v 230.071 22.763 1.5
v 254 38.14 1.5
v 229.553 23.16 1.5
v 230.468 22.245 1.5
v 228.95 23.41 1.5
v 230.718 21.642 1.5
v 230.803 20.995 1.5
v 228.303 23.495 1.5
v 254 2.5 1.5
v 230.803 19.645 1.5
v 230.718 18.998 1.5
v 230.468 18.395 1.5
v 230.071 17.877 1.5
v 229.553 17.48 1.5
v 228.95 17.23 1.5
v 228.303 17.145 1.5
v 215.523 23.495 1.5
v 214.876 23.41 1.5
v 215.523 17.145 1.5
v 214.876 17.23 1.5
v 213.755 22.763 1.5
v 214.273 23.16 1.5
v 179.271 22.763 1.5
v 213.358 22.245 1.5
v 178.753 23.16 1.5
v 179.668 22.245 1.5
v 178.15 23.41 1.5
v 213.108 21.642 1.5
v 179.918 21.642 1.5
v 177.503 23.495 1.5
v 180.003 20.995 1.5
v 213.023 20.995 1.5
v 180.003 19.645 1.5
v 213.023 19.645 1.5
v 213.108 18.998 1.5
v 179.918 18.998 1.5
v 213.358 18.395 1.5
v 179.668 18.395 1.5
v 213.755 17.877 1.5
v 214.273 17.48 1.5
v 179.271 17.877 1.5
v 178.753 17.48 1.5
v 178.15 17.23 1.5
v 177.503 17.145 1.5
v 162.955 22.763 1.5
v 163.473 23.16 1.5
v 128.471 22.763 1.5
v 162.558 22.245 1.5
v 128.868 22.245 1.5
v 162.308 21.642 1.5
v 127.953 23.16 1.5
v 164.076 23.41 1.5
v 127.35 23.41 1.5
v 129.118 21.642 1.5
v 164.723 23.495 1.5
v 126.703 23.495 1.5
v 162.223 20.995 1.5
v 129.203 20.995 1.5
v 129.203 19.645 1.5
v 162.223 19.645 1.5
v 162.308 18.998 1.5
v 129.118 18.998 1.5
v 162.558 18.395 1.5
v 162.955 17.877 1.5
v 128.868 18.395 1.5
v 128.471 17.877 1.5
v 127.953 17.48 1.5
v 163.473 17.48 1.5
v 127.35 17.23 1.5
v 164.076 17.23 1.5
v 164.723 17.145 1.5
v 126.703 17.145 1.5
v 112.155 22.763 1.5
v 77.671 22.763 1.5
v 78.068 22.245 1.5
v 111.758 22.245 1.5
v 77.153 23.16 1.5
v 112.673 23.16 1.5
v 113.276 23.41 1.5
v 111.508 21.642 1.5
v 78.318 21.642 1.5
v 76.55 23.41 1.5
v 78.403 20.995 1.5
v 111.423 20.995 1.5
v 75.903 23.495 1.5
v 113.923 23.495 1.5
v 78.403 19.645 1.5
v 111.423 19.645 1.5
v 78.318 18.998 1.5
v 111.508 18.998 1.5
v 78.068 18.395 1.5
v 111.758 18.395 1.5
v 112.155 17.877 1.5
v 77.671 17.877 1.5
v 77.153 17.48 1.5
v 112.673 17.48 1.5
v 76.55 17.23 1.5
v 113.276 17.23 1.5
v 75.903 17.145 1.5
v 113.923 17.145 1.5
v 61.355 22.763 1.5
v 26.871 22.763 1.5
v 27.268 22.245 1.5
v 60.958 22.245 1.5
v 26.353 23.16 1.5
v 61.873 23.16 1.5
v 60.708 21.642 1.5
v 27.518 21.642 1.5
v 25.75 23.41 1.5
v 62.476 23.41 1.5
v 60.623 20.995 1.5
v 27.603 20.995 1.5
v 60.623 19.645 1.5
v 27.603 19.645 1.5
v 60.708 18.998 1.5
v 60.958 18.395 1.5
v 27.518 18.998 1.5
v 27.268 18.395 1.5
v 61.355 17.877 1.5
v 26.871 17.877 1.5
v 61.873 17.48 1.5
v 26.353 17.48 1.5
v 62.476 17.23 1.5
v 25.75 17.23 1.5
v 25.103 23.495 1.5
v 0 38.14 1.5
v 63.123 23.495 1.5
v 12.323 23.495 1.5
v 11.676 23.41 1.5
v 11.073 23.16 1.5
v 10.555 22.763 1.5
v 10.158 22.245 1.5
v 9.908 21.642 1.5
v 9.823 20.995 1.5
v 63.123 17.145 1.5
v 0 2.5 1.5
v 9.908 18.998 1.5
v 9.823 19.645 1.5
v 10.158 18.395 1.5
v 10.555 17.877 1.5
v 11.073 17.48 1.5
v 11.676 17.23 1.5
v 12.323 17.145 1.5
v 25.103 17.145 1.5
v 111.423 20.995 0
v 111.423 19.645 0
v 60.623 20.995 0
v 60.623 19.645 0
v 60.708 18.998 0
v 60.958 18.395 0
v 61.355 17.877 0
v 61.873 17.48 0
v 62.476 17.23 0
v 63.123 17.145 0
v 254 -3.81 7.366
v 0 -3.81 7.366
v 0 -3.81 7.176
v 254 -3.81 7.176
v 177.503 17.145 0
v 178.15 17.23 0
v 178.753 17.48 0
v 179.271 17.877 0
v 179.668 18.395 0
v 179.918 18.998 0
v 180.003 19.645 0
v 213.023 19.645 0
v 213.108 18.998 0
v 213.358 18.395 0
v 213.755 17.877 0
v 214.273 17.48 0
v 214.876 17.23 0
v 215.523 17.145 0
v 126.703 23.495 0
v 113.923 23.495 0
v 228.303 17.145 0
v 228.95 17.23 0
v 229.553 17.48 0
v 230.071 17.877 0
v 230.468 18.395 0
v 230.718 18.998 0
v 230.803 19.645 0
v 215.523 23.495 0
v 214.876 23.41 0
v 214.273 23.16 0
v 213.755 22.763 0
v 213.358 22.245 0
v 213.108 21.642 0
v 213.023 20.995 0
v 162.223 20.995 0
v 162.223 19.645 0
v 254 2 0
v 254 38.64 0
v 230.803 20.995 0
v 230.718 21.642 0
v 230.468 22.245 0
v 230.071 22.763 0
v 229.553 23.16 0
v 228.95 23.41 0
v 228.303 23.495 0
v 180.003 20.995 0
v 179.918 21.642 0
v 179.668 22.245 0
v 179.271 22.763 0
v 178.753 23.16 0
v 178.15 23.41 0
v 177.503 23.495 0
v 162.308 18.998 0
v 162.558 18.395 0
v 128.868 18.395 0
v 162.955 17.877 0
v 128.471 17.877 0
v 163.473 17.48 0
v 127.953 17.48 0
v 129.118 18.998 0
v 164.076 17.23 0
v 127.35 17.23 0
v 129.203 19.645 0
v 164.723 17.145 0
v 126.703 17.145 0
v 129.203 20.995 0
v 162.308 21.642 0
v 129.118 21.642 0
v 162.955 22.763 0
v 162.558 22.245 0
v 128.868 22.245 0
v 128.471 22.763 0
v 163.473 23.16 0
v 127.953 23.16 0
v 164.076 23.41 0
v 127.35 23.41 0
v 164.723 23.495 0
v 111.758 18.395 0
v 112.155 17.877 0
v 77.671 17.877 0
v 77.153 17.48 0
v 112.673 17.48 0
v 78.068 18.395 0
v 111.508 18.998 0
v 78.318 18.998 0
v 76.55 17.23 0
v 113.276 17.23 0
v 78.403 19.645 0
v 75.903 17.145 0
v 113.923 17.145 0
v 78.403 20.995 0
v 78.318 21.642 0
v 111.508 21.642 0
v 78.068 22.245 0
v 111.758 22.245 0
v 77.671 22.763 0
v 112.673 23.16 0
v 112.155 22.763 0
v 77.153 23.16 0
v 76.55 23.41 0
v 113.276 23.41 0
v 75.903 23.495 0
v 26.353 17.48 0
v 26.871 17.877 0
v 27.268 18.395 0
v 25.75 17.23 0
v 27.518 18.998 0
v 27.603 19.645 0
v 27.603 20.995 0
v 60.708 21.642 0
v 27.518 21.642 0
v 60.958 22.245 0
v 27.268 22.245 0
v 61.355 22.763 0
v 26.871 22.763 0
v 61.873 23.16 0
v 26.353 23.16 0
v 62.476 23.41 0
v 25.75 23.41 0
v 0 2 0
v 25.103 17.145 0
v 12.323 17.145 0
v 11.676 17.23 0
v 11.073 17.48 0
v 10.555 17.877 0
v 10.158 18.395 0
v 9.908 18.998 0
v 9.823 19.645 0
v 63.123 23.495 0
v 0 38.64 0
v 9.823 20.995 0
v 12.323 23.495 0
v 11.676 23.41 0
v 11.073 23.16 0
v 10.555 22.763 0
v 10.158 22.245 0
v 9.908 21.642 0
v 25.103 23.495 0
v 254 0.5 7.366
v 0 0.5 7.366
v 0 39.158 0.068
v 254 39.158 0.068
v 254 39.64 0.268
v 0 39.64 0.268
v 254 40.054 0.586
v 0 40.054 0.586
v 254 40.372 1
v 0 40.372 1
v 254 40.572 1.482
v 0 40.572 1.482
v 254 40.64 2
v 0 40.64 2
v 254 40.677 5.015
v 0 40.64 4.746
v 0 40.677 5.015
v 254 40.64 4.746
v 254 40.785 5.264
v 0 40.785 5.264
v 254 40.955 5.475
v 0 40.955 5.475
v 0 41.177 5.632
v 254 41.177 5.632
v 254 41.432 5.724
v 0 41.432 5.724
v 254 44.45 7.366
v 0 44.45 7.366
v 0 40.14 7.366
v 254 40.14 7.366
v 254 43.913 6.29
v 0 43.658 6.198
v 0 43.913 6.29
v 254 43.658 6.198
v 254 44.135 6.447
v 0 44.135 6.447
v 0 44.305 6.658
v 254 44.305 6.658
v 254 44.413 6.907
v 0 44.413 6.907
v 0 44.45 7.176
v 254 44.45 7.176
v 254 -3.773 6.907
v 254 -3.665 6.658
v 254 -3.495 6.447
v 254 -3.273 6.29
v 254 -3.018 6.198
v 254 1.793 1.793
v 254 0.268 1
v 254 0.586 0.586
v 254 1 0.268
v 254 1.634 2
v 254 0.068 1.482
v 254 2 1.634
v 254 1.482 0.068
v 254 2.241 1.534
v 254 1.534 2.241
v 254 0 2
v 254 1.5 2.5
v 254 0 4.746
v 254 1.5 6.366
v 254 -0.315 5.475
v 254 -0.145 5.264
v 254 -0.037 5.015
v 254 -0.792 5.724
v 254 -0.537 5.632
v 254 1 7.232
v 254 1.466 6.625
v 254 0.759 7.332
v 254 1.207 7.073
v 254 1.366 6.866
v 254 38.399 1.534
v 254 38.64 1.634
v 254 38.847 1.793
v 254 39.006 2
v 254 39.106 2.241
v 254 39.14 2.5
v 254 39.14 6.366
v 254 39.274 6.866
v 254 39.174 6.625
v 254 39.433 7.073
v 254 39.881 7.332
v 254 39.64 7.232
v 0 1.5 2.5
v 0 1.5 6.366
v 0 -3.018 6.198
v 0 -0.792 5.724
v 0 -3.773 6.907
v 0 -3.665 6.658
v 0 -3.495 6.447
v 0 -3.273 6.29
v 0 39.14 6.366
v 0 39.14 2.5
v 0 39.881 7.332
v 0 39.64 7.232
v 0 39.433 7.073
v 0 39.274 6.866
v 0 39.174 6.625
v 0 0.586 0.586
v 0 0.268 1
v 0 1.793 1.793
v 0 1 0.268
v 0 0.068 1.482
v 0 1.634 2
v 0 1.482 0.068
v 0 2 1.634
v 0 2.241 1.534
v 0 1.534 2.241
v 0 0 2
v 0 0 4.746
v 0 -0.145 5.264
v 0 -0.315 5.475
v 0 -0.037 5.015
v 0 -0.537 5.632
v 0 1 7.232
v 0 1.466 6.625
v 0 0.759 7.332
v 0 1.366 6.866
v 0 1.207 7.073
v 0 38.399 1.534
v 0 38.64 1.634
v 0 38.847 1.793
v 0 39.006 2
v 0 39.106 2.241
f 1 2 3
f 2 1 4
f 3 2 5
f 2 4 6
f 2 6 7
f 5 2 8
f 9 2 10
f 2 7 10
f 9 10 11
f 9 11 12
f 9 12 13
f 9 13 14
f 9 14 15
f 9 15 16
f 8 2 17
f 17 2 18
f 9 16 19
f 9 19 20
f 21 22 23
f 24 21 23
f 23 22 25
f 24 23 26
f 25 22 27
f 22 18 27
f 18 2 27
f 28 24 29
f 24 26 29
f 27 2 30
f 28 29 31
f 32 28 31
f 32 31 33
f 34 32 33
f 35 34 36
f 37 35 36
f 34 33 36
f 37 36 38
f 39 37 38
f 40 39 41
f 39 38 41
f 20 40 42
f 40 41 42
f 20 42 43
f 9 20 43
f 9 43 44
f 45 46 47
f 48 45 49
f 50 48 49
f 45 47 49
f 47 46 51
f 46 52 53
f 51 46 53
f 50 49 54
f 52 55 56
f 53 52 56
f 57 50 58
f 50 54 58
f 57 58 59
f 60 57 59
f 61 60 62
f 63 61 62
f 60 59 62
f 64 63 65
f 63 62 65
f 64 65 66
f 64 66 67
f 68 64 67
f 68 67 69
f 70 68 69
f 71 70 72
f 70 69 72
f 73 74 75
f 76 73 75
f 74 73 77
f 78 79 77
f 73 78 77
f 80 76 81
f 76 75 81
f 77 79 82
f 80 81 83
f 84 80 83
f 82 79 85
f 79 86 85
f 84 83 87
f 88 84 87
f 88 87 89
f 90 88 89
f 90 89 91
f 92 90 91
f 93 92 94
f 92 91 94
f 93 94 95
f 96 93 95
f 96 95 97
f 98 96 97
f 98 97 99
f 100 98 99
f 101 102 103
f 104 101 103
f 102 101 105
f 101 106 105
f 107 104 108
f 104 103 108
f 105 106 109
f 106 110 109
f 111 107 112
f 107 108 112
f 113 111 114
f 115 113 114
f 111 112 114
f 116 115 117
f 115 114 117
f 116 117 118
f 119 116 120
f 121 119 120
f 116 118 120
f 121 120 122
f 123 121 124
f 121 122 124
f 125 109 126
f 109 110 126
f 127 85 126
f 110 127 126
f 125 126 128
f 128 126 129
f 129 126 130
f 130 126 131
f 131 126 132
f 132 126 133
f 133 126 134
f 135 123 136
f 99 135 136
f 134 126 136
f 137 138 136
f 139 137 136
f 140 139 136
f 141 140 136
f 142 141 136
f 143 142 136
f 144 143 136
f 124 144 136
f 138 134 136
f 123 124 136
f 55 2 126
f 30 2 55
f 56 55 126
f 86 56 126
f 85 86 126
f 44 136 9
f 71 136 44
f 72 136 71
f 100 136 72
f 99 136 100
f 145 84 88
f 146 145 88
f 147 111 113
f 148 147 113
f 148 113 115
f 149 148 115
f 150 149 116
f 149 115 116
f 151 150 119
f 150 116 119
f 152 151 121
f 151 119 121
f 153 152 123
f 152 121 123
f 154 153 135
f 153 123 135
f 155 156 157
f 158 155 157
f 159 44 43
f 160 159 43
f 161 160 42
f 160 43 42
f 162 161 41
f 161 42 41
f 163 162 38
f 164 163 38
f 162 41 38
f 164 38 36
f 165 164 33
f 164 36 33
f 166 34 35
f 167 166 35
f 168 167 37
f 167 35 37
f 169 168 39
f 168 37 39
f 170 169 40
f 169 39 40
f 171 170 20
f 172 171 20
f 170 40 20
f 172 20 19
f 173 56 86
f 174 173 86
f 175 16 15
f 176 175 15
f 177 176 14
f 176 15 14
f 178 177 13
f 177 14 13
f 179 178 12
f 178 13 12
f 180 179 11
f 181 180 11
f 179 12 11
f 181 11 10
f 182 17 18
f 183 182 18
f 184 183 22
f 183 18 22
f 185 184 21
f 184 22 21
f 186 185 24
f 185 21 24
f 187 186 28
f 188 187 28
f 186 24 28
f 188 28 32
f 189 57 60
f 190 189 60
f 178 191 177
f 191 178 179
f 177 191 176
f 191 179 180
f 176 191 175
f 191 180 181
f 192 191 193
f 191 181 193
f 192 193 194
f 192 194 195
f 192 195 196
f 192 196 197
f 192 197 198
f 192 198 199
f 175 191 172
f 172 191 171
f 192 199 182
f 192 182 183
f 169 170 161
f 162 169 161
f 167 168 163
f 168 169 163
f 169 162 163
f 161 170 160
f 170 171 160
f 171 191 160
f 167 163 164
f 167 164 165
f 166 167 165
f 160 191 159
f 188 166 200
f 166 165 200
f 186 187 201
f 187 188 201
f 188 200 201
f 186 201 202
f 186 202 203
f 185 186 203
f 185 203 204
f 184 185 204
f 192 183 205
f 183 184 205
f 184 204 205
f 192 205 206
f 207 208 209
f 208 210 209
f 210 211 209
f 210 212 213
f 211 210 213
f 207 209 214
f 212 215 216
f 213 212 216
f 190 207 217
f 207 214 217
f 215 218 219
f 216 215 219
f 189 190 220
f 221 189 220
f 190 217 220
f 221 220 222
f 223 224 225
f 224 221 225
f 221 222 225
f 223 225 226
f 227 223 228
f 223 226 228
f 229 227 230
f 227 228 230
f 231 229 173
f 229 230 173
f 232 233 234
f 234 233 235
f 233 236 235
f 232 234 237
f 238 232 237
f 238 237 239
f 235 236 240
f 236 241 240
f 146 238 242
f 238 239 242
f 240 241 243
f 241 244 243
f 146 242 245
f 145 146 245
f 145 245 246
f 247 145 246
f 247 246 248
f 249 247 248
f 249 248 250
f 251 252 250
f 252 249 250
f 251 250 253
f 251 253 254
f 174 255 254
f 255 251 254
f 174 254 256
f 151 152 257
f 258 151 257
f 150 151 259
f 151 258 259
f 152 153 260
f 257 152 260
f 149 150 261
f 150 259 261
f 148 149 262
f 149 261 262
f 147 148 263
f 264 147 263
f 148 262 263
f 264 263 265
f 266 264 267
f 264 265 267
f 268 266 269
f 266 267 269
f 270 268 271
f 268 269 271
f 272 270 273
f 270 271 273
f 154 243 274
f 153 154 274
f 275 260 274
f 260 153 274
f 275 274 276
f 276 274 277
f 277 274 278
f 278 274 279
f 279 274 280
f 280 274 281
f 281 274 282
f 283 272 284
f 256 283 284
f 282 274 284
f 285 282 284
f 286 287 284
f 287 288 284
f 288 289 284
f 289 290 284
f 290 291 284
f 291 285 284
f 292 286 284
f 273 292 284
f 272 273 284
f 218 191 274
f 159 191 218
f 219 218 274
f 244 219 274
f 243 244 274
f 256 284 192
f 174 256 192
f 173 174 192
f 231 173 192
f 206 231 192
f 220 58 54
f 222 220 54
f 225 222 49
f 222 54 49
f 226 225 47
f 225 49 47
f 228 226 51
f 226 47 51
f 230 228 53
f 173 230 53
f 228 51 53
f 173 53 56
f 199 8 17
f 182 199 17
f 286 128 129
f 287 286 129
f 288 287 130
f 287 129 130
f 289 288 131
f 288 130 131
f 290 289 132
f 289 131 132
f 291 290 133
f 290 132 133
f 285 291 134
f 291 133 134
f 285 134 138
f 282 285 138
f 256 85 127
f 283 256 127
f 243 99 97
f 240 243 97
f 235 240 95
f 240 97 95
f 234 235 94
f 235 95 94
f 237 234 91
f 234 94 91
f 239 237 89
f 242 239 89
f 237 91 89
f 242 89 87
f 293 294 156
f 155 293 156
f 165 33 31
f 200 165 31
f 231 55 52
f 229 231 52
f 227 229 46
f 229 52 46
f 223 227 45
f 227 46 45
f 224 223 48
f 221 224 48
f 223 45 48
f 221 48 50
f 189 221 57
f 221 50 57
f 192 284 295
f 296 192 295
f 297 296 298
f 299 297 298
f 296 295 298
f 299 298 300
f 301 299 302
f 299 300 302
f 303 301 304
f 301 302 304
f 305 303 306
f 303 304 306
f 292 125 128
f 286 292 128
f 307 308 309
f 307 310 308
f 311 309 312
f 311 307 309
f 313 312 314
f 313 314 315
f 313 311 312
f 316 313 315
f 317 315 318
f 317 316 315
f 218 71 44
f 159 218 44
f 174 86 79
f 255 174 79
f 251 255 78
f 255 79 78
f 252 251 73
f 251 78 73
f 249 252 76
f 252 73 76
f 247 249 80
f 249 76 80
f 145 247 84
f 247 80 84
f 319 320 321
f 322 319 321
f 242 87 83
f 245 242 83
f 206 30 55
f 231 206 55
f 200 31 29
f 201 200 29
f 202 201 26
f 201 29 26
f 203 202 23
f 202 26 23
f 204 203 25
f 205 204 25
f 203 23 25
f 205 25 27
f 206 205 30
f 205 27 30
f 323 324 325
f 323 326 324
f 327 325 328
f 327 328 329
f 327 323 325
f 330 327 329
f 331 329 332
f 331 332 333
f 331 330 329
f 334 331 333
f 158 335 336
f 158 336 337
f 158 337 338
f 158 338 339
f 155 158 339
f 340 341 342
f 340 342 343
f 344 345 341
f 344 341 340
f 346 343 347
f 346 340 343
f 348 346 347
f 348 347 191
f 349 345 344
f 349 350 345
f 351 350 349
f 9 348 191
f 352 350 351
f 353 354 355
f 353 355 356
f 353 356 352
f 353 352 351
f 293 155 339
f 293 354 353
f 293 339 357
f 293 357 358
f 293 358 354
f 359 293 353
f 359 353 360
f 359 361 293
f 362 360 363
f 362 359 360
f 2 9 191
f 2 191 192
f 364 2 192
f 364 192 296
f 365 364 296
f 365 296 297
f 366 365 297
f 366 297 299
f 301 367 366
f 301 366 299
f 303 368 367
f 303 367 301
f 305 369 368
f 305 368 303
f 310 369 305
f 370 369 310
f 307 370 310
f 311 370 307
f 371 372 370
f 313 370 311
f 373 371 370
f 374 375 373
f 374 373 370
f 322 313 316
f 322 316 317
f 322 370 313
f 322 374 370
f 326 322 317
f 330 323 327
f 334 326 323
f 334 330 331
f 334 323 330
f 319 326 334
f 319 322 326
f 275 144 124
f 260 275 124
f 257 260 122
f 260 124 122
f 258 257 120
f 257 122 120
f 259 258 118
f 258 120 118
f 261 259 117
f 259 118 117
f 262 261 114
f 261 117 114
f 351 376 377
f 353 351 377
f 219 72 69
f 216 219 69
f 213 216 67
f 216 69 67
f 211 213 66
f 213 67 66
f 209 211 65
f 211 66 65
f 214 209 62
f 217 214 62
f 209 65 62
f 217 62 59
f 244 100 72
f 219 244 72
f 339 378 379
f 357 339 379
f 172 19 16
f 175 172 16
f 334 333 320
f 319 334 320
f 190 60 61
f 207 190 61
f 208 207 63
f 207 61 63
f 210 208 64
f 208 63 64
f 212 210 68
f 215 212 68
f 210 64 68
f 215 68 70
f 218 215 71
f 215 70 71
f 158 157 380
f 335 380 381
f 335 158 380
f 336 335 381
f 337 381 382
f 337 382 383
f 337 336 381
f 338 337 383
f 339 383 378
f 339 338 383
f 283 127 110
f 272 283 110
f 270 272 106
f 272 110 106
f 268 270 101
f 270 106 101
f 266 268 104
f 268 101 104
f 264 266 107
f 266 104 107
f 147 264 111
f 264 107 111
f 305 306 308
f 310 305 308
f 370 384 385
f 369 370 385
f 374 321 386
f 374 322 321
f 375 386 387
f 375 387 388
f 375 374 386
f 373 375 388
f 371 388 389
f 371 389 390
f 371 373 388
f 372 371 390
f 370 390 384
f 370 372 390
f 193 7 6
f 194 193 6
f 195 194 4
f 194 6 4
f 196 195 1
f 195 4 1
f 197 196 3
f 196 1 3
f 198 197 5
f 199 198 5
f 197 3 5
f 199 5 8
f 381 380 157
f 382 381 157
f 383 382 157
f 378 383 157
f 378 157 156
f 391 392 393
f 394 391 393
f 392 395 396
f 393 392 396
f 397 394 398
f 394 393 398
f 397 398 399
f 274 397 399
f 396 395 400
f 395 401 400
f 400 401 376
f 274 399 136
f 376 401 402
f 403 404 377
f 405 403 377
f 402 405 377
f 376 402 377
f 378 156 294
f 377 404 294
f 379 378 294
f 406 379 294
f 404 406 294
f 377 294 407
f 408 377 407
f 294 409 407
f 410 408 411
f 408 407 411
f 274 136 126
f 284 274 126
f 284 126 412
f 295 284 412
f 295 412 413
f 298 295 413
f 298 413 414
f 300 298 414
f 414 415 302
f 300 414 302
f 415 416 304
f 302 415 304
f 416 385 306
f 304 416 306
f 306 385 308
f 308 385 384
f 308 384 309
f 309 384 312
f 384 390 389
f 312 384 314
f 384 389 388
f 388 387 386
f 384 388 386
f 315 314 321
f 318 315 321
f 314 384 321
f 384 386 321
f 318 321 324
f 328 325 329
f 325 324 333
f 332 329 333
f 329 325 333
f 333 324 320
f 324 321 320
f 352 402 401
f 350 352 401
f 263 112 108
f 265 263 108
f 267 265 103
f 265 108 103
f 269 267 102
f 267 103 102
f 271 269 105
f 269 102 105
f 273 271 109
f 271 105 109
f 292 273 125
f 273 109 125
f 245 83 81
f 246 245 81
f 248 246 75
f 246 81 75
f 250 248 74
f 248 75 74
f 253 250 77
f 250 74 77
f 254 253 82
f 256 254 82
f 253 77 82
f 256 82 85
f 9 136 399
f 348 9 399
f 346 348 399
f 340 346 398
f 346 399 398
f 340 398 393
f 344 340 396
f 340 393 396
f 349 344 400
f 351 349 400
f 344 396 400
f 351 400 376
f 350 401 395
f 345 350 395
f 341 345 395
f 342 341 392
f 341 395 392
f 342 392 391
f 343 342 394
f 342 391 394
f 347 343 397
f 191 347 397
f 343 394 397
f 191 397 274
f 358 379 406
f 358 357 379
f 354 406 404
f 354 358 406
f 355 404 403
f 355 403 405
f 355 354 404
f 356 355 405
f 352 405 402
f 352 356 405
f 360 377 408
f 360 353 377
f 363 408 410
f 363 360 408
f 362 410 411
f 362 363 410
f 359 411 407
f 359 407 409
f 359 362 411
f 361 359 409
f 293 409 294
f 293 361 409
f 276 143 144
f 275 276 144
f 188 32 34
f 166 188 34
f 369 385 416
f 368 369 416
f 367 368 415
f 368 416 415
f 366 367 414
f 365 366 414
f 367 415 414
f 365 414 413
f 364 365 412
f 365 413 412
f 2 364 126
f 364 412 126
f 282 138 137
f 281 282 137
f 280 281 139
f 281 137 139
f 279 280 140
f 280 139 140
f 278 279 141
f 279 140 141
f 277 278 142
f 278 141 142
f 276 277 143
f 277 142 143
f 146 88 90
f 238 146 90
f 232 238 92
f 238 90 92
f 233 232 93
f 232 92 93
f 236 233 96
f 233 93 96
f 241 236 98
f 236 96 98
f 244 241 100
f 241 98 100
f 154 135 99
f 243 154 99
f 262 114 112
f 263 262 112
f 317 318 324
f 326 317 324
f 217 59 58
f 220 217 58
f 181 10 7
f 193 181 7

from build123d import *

# Parameters (mm, degrees)
F1_DEPTH = 254
F2_R     = 1
F4_DEPTH = 25.4


with BuildPart() as f1:
    # F0 (on Right) → F1 (new body)
    with BuildSketch(Plane.YZ):
        with BuildLine():
            ThreePointArc((0, 2), (0.585786, 0.585786), (2, 0))
            Line((2, 0), (38.64, 0))
            ThreePointArc((38.64, 0), (40.054214, 0.585786), (40.64, 2))
            Line((40.64, 2), (40.64, 5.556))
            Line((40.64, 5.556), (44.45, 6.366))
            Line((44.45, 6.366), (44.45, 7.366))
            Line((44.45, 7.366), (40.64, 7.366))
            Line((40.64, 7.366), (39.14, 7.366))
            Line((39.14, 7.366), (39.14, 2.5))
            ThreePointArc((39.14, 2.5), (38.847107, 1.792893), (38.14, 1.5))
            Line((38.14, 1.5), (2.5, 1.5))
            ThreePointArc((2.5, 1.5), (1.792893, 1.792893), (1.5, 2.5))
            Line((1.5, 2.5), (1.5, 7.366))
            Line((1.5, 7.366), (0, 7.366))
            Line((0, 7.366), (-3.81, 7.366))
            Line((-3.81, 7.366), (-3.81, 6.366))
            Line((-3.81, 6.366), (0, 5.556))
            Line((0, 5.556), (0, 2))
        make_face()
    extrude(amount=F1_DEPTH)

    # F2
    f2_edges = [f1.edges().sort_by_distance(p)[0] for p in [
        (127, 39.14, 7.366),
        (127, 1.5, 7.366),
        (127, 0, 5.556),
        (127, 40.64, 5.556),
        (127, 44.45, 6.366),
        (127, -3.81, 6.366),
    ]]
    fillet(f2_edges, radius=F2_R)

    # F3 (on face) → F4 (cut)
    with BuildSketch(Plane.XY.offset(1.5)):
        with BuildLine():
            Line((12.323191, 17.145), (25.103191, 17.145))
            ThreePointArc((25.103191, 17.145), (26.870958, 17.877233), (27.603191, 19.645))
            Line((27.603191, 19.645), (27.603191, 20.995))
            ThreePointArc((27.603191, 20.995), (26.870958, 22.762767), (25.103191, 23.495))
            Line((25.103191, 23.495), (12.323191, 23.495))
            ThreePointArc((12.323191, 23.495), (10.555424, 22.762767), (9.823191, 20.995))
            Line((9.823191, 20.995), (9.823191, 19.645))
            ThreePointArc((9.823191, 19.645), (10.555424, 17.877233), (12.323191, 17.145))
        make_face()
        with BuildLine():
            ThreePointArc((78.403191, 20.995), (77.670958, 22.762767), (75.903191, 23.495))
            Line((75.903191, 23.495), (63.123191, 23.495))
            ThreePointArc((63.123191, 23.495), (61.355424, 22.762767), (60.623191, 20.995))
            Line((60.623191, 20.995), (60.623191, 19.645))
            ThreePointArc((60.623191, 19.645), (61.355424, 17.877233), (63.123191, 17.145))
            Line((63.123191, 17.145), (75.903191, 17.145))
            ThreePointArc((75.903191, 17.145), (77.670958, 17.877233), (78.403191, 19.645))
            Line((78.403191, 19.645), (78.403191, 20.995))
        make_face()
        with BuildLine():
            ThreePointArc((129.203191, 20.995), (128.470958, 22.762767), (126.703191, 23.495))
            Line((126.703191, 23.495), (113.923191, 23.495))
            ThreePointArc((113.923191, 23.495), (112.155424, 22.762767), (111.423191, 20.995))
            Line((111.423191, 20.995), (111.423191, 19.645))
            ThreePointArc((111.423191, 19.645), (112.155424, 17.877233), (113.923191, 17.145))
            Line((113.923191, 17.145), (126.703191, 17.145))
            ThreePointArc((126.703191, 17.145), (128.470958, 17.877233), (129.203191, 19.645))
            Line((129.203191, 19.645), (129.203191, 20.995))
        make_face()
        with BuildLine():
            ThreePointArc((180.003191, 20.995), (179.270958, 22.762767), (177.503191, 23.495))
            Line((177.503191, 23.495), (164.723191, 23.495))
            ThreePointArc((164.723191, 23.495), (162.955424, 22.762767), (162.223191, 20.995))
            Line((162.223191, 20.995), (162.223191, 19.645))
            ThreePointArc((162.223191, 19.645), (162.955424, 17.877233), (164.723191, 17.145))
            Line((164.723191, 17.145), (177.503191, 17.145))
            ThreePointArc((177.503191, 17.145), (179.270958, 17.877233), (180.003191, 19.645))
            Line((180.003191, 19.645), (180.003191, 20.995))
        make_face()
        with BuildLine():
            ThreePointArc((230.803191, 20.995), (230.070958, 22.762767), (228.303191, 23.495))
            Line((228.303191, 23.495), (215.523191, 23.495))
            ThreePointArc((215.523191, 23.495), (213.755424, 22.762767), (213.023191, 20.995))
            Line((213.023191, 20.995), (213.023191, 19.645))
            ThreePointArc((213.023191, 19.645), (213.755424, 17.877233), (215.523191, 17.145))
            Line((215.523191, 17.145), (228.303191, 17.145))
            ThreePointArc((228.303191, 17.145), (230.070958, 17.877233), (230.803191, 19.645))
            Line((230.803191, 19.645), (230.803191, 20.995))
        make_face()
    extrude(amount=-F4_DEPTH, mode=Mode.SUBTRACT)


solid = f1.part
